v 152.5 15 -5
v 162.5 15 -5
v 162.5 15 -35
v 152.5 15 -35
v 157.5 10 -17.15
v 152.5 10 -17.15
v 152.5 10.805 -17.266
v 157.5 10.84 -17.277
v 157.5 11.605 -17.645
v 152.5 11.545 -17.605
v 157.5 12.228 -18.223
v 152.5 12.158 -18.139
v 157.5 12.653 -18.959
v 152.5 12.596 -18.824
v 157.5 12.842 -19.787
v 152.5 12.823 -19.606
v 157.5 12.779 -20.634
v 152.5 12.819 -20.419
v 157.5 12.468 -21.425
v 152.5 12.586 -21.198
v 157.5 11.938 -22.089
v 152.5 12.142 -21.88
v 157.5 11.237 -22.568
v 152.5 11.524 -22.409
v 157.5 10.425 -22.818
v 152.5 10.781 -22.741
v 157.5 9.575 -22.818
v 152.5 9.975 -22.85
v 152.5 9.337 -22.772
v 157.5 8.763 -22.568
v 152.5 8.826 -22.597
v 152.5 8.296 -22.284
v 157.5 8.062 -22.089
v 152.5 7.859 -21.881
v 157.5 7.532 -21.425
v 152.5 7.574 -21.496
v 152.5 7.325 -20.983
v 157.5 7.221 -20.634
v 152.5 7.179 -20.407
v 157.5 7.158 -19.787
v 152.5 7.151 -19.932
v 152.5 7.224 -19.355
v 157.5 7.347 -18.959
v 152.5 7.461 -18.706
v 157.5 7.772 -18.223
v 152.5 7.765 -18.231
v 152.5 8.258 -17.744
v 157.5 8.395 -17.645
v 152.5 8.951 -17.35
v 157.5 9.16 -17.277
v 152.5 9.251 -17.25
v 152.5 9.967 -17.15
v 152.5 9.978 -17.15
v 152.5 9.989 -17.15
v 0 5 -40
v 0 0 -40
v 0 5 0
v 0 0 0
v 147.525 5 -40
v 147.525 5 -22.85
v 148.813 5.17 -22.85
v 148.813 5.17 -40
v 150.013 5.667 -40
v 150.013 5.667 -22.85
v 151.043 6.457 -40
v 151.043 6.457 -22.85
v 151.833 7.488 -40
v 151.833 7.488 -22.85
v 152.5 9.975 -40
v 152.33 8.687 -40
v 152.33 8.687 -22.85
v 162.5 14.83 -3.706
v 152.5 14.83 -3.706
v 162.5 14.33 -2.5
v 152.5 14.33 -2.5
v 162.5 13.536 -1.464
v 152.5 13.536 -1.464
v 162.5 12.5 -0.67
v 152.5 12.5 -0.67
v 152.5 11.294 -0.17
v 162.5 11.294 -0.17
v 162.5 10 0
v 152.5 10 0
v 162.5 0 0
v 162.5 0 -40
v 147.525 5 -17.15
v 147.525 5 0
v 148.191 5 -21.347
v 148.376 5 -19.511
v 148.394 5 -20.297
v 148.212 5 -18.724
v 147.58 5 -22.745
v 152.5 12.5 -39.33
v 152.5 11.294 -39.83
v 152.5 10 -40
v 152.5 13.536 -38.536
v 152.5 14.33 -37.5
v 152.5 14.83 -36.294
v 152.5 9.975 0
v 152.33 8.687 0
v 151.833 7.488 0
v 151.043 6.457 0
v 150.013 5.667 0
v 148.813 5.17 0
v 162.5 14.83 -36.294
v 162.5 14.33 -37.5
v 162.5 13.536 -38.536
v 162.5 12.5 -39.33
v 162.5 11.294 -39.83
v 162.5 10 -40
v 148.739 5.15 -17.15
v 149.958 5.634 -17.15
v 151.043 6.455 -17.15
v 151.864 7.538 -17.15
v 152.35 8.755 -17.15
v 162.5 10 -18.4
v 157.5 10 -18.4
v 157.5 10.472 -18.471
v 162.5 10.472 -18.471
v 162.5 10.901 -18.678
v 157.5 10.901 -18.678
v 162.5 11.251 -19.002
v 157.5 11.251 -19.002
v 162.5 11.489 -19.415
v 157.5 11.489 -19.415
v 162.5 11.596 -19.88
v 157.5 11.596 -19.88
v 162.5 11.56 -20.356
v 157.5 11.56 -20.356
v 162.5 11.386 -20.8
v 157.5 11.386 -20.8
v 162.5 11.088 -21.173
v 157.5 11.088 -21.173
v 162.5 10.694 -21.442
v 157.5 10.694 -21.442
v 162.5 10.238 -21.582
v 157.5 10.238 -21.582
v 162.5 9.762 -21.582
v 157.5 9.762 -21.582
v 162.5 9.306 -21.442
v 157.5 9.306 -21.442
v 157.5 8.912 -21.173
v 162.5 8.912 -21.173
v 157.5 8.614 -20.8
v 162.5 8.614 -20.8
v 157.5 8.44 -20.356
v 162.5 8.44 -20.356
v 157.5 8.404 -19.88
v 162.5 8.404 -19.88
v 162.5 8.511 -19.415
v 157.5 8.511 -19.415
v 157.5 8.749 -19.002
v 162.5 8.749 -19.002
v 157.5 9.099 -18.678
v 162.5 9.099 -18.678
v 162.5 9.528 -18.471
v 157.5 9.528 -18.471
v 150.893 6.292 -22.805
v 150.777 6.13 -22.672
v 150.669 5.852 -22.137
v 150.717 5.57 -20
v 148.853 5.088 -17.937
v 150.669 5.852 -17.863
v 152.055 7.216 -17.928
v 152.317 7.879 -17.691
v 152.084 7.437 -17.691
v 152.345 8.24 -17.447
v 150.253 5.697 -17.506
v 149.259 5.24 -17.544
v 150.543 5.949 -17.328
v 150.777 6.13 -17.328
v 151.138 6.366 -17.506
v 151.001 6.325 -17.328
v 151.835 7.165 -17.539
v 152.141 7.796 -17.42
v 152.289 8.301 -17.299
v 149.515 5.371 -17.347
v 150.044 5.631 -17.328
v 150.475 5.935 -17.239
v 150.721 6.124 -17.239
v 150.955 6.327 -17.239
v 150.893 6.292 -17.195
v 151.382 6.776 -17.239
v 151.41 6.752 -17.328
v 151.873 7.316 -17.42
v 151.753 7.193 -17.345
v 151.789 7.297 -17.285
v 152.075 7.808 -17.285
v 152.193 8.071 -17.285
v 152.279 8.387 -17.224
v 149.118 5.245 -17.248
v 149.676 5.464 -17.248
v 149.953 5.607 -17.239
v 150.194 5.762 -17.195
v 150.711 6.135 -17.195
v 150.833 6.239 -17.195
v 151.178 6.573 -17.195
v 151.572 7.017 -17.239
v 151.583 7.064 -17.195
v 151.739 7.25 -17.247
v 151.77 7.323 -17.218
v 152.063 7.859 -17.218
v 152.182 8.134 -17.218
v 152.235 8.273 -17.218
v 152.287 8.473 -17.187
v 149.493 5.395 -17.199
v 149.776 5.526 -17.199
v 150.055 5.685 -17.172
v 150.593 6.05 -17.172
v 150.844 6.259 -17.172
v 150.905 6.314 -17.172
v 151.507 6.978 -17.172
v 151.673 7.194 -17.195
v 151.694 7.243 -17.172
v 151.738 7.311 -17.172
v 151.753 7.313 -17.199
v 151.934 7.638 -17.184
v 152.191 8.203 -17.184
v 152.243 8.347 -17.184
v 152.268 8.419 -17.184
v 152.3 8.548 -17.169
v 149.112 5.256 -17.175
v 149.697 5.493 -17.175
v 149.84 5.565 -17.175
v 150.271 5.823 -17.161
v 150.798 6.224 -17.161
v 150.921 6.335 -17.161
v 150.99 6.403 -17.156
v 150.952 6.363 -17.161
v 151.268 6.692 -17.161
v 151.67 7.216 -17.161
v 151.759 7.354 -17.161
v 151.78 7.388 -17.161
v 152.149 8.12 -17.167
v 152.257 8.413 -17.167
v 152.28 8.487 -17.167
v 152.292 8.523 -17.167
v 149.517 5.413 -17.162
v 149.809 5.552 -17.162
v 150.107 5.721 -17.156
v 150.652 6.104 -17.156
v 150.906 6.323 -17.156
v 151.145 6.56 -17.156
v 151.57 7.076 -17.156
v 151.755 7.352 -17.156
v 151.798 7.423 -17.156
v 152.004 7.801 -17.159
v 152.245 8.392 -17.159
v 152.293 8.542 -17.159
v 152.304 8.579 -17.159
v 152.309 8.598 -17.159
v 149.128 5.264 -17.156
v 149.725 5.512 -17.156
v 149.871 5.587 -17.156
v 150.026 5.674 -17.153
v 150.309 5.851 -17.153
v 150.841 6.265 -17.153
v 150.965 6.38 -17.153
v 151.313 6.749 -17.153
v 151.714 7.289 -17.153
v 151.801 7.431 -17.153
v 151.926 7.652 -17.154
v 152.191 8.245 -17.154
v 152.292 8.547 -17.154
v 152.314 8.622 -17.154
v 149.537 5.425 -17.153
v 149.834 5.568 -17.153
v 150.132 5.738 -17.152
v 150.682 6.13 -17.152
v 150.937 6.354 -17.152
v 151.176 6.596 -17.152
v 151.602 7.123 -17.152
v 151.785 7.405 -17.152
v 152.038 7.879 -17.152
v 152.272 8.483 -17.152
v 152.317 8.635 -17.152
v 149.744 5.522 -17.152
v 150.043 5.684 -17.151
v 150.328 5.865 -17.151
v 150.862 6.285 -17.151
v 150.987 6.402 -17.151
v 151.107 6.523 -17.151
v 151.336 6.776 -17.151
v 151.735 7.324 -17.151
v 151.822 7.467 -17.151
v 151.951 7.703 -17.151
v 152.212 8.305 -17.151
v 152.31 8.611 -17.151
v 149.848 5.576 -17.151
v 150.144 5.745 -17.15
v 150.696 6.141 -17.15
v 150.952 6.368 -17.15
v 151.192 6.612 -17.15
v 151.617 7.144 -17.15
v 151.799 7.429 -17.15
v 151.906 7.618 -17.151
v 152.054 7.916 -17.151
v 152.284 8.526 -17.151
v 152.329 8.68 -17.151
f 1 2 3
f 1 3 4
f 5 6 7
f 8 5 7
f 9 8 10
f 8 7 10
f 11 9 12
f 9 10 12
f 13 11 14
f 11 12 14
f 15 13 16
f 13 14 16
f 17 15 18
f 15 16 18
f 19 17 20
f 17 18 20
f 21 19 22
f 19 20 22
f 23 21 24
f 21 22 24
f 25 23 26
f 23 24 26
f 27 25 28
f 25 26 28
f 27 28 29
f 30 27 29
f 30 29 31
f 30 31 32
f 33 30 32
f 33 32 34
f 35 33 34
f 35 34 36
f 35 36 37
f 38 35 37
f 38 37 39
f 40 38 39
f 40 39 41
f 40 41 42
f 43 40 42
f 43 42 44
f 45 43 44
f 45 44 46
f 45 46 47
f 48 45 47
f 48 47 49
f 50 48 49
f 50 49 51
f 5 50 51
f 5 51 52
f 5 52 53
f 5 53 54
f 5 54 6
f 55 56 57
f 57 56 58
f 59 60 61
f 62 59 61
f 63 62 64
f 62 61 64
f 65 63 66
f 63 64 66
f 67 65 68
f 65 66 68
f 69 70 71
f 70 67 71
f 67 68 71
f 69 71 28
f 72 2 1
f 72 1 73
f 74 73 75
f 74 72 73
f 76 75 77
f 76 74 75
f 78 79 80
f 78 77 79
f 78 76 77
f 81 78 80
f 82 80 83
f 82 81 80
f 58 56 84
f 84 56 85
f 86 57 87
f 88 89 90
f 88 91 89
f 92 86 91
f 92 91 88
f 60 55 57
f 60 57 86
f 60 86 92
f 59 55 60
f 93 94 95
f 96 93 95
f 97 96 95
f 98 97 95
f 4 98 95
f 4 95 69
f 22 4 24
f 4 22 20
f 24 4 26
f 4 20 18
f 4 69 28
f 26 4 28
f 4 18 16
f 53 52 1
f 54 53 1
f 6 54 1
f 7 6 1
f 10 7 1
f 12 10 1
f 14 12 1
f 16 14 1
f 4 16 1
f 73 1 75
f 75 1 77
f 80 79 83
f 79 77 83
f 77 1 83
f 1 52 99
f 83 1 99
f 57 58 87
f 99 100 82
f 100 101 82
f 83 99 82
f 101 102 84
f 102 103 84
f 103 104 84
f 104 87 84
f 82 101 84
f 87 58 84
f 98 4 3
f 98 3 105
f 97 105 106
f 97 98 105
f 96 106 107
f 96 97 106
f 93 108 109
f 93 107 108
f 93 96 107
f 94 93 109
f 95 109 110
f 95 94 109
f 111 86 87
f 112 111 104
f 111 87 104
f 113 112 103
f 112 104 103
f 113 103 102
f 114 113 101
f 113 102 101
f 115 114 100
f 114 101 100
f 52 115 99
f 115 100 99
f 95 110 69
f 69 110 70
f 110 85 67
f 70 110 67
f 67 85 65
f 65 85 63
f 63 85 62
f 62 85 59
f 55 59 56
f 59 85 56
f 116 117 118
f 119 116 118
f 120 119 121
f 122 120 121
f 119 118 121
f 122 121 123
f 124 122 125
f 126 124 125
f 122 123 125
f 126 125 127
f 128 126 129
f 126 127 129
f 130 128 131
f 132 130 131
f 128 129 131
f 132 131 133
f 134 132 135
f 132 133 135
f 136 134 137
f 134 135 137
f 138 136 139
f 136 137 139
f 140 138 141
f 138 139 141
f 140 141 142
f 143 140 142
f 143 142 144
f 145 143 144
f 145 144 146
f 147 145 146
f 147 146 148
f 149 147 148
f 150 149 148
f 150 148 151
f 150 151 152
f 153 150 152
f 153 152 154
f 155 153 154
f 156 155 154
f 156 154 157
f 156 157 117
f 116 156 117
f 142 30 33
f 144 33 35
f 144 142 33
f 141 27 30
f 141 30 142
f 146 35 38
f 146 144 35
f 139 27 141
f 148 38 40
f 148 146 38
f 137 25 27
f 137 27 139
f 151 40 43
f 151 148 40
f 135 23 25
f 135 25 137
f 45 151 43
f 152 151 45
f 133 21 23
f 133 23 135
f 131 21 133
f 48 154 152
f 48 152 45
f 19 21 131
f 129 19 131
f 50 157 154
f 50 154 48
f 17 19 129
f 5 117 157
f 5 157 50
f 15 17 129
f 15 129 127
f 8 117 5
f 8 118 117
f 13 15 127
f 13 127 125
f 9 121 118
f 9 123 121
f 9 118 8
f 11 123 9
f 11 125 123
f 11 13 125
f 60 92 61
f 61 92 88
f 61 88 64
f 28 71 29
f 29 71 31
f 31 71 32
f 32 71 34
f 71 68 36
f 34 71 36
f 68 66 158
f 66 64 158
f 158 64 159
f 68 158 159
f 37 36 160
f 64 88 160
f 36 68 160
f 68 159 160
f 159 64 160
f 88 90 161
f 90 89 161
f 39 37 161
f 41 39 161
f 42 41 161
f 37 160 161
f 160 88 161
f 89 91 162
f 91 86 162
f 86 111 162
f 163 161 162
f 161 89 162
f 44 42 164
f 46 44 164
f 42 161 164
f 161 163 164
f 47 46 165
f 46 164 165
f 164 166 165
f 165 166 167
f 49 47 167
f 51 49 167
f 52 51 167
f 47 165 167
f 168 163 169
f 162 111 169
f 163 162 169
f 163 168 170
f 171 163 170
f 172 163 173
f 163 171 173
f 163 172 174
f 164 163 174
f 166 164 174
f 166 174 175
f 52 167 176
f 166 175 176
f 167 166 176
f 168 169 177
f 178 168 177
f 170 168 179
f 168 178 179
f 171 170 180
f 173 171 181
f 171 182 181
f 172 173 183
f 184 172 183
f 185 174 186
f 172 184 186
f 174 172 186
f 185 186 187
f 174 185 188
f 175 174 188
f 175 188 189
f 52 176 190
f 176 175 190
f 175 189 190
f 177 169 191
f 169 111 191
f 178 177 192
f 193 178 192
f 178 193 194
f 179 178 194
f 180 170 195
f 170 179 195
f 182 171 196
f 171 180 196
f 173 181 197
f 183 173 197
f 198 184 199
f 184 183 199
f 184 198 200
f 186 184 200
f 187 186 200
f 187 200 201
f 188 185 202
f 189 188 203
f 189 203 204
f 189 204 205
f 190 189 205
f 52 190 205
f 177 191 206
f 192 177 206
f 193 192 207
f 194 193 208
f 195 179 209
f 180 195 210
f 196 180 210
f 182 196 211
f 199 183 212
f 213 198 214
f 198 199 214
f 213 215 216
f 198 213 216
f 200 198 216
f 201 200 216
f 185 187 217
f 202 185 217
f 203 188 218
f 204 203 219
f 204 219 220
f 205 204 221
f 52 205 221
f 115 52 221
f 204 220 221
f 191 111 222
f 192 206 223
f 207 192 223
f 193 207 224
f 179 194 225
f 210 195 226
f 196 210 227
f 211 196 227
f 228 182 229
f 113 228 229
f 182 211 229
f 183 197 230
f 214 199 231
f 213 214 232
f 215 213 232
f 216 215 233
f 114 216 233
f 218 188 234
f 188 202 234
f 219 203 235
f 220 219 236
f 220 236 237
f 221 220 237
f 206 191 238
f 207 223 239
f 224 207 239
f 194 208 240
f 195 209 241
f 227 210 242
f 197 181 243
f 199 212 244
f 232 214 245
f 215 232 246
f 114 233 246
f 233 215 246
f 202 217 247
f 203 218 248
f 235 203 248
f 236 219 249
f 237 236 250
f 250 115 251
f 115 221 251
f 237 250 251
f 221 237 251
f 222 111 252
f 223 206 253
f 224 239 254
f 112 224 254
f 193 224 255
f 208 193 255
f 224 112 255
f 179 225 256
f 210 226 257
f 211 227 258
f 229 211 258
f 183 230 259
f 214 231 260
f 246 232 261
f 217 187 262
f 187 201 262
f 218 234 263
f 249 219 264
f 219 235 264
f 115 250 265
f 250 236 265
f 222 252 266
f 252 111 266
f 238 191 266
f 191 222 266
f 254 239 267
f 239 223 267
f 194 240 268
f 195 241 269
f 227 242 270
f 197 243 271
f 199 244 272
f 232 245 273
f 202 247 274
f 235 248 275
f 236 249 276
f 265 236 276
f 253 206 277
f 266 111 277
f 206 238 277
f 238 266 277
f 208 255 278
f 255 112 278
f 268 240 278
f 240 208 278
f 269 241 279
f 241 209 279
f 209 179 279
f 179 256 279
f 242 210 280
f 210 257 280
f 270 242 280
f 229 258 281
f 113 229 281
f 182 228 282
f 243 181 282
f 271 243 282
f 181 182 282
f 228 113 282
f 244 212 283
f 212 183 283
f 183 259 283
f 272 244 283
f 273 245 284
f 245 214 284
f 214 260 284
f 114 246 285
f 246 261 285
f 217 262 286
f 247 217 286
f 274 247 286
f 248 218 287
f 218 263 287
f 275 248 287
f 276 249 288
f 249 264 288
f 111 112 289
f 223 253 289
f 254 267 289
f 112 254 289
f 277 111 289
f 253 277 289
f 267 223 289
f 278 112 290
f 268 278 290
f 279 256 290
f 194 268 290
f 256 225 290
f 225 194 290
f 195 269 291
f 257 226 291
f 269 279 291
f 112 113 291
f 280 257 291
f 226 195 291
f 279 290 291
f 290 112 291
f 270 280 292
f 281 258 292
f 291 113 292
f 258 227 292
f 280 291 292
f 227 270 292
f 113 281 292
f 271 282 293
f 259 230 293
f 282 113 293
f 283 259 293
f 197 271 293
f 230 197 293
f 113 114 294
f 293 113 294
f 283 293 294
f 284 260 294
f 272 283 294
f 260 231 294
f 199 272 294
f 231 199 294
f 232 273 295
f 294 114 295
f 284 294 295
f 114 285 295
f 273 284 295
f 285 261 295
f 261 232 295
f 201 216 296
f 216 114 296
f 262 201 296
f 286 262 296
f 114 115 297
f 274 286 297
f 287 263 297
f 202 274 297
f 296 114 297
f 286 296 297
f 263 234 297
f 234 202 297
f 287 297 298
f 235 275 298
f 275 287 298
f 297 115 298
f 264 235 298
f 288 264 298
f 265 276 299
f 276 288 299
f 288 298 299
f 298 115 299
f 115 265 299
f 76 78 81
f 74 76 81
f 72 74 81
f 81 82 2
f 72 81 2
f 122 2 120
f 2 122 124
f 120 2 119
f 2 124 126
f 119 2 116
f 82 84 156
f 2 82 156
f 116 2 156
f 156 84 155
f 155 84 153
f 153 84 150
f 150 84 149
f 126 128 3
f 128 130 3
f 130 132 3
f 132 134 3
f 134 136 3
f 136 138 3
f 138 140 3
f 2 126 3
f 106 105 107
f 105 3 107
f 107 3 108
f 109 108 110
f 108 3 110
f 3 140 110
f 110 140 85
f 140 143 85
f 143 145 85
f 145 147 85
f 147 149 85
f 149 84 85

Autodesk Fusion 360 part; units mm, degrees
sketch "Sketch1" plane through (0, 0, 0) normal (0, 1, 0) x (1, 0, 0)
  line L0 (0, 0) -> (162.5, 0)
  line L1 (162.5, 0) -> (162.5, 40)
  line L2 (162.5, 40) -> (0, 40)
  line L3 (0, 40) -> (0, 0)
  dimension "d1" = 162.5
  dimension "d2" = 40
extrude "Extrude1" add sketch "Sketch1" along normal blind 5
sketch "Sketch2" plane through (0, 5, 0) normal (0, 1, 0) x (-1, 0, 0)
  line L0 (0, -40) -> (0, 0)
  line L1 (0, 0) -> (-162.5, 0)
  line L2 (-162.5, 0) -> (-162.5, -40)
  line L3 (-162.5, -40) -> (0, -40)
  line L4 (-162.5, -40) -> (-152.5, -40)
  line L5 (-152.5, -40) -> (-152.5, 0)
  line L6 (-152.5, 0) -> (-162.5, 0)
  line L7 (-162.5, 0) -> (-162.5, -40)
  dimension "d10" = 10
extrude "Extrude2" add sketch "Sketch2" along normal blind 10 contours L1 L2 L3 L4 L5 L6 L7
sketch "Sketch3" plane through (152.5, 0, 0) normal (-1, 0, 0) x (0, 0, 1)
  line L0 (-40, 5) -> (0, 5)
  line L1 (0, 5) -> (0, 15)
  line L2 (0, 15) -> (-40, 15)
  line L3 (-40, 15) -> (-40, 5)
  line L4 (-40, 15) -> (0, 5) construction
  line L5 (-40, 5) -> (0, 15) construction
  circle A0 centre (-20, 10) radius 1.6
  circle A1 centre (-20, 10) radius 2.85
  dimension "d7" = 3.2
  dimension "d15" = 5.7
extrude "Extrude3" cut sketch "Sketch3" against normal blind 10.5 contours A0
fillet "Fillet1" radius 5 1 edges at (157.5, 15, 0)
extrude "Extrude4" cut sketch "Sketch3" along normal blind -5 and the other way blind 0 contours A1
fillet "Fillet3" radius 5 1 edges at (152.5, 5, -20)
fillet "Fillet4" radius 5 1 edges at (157.5, 15, -40)
